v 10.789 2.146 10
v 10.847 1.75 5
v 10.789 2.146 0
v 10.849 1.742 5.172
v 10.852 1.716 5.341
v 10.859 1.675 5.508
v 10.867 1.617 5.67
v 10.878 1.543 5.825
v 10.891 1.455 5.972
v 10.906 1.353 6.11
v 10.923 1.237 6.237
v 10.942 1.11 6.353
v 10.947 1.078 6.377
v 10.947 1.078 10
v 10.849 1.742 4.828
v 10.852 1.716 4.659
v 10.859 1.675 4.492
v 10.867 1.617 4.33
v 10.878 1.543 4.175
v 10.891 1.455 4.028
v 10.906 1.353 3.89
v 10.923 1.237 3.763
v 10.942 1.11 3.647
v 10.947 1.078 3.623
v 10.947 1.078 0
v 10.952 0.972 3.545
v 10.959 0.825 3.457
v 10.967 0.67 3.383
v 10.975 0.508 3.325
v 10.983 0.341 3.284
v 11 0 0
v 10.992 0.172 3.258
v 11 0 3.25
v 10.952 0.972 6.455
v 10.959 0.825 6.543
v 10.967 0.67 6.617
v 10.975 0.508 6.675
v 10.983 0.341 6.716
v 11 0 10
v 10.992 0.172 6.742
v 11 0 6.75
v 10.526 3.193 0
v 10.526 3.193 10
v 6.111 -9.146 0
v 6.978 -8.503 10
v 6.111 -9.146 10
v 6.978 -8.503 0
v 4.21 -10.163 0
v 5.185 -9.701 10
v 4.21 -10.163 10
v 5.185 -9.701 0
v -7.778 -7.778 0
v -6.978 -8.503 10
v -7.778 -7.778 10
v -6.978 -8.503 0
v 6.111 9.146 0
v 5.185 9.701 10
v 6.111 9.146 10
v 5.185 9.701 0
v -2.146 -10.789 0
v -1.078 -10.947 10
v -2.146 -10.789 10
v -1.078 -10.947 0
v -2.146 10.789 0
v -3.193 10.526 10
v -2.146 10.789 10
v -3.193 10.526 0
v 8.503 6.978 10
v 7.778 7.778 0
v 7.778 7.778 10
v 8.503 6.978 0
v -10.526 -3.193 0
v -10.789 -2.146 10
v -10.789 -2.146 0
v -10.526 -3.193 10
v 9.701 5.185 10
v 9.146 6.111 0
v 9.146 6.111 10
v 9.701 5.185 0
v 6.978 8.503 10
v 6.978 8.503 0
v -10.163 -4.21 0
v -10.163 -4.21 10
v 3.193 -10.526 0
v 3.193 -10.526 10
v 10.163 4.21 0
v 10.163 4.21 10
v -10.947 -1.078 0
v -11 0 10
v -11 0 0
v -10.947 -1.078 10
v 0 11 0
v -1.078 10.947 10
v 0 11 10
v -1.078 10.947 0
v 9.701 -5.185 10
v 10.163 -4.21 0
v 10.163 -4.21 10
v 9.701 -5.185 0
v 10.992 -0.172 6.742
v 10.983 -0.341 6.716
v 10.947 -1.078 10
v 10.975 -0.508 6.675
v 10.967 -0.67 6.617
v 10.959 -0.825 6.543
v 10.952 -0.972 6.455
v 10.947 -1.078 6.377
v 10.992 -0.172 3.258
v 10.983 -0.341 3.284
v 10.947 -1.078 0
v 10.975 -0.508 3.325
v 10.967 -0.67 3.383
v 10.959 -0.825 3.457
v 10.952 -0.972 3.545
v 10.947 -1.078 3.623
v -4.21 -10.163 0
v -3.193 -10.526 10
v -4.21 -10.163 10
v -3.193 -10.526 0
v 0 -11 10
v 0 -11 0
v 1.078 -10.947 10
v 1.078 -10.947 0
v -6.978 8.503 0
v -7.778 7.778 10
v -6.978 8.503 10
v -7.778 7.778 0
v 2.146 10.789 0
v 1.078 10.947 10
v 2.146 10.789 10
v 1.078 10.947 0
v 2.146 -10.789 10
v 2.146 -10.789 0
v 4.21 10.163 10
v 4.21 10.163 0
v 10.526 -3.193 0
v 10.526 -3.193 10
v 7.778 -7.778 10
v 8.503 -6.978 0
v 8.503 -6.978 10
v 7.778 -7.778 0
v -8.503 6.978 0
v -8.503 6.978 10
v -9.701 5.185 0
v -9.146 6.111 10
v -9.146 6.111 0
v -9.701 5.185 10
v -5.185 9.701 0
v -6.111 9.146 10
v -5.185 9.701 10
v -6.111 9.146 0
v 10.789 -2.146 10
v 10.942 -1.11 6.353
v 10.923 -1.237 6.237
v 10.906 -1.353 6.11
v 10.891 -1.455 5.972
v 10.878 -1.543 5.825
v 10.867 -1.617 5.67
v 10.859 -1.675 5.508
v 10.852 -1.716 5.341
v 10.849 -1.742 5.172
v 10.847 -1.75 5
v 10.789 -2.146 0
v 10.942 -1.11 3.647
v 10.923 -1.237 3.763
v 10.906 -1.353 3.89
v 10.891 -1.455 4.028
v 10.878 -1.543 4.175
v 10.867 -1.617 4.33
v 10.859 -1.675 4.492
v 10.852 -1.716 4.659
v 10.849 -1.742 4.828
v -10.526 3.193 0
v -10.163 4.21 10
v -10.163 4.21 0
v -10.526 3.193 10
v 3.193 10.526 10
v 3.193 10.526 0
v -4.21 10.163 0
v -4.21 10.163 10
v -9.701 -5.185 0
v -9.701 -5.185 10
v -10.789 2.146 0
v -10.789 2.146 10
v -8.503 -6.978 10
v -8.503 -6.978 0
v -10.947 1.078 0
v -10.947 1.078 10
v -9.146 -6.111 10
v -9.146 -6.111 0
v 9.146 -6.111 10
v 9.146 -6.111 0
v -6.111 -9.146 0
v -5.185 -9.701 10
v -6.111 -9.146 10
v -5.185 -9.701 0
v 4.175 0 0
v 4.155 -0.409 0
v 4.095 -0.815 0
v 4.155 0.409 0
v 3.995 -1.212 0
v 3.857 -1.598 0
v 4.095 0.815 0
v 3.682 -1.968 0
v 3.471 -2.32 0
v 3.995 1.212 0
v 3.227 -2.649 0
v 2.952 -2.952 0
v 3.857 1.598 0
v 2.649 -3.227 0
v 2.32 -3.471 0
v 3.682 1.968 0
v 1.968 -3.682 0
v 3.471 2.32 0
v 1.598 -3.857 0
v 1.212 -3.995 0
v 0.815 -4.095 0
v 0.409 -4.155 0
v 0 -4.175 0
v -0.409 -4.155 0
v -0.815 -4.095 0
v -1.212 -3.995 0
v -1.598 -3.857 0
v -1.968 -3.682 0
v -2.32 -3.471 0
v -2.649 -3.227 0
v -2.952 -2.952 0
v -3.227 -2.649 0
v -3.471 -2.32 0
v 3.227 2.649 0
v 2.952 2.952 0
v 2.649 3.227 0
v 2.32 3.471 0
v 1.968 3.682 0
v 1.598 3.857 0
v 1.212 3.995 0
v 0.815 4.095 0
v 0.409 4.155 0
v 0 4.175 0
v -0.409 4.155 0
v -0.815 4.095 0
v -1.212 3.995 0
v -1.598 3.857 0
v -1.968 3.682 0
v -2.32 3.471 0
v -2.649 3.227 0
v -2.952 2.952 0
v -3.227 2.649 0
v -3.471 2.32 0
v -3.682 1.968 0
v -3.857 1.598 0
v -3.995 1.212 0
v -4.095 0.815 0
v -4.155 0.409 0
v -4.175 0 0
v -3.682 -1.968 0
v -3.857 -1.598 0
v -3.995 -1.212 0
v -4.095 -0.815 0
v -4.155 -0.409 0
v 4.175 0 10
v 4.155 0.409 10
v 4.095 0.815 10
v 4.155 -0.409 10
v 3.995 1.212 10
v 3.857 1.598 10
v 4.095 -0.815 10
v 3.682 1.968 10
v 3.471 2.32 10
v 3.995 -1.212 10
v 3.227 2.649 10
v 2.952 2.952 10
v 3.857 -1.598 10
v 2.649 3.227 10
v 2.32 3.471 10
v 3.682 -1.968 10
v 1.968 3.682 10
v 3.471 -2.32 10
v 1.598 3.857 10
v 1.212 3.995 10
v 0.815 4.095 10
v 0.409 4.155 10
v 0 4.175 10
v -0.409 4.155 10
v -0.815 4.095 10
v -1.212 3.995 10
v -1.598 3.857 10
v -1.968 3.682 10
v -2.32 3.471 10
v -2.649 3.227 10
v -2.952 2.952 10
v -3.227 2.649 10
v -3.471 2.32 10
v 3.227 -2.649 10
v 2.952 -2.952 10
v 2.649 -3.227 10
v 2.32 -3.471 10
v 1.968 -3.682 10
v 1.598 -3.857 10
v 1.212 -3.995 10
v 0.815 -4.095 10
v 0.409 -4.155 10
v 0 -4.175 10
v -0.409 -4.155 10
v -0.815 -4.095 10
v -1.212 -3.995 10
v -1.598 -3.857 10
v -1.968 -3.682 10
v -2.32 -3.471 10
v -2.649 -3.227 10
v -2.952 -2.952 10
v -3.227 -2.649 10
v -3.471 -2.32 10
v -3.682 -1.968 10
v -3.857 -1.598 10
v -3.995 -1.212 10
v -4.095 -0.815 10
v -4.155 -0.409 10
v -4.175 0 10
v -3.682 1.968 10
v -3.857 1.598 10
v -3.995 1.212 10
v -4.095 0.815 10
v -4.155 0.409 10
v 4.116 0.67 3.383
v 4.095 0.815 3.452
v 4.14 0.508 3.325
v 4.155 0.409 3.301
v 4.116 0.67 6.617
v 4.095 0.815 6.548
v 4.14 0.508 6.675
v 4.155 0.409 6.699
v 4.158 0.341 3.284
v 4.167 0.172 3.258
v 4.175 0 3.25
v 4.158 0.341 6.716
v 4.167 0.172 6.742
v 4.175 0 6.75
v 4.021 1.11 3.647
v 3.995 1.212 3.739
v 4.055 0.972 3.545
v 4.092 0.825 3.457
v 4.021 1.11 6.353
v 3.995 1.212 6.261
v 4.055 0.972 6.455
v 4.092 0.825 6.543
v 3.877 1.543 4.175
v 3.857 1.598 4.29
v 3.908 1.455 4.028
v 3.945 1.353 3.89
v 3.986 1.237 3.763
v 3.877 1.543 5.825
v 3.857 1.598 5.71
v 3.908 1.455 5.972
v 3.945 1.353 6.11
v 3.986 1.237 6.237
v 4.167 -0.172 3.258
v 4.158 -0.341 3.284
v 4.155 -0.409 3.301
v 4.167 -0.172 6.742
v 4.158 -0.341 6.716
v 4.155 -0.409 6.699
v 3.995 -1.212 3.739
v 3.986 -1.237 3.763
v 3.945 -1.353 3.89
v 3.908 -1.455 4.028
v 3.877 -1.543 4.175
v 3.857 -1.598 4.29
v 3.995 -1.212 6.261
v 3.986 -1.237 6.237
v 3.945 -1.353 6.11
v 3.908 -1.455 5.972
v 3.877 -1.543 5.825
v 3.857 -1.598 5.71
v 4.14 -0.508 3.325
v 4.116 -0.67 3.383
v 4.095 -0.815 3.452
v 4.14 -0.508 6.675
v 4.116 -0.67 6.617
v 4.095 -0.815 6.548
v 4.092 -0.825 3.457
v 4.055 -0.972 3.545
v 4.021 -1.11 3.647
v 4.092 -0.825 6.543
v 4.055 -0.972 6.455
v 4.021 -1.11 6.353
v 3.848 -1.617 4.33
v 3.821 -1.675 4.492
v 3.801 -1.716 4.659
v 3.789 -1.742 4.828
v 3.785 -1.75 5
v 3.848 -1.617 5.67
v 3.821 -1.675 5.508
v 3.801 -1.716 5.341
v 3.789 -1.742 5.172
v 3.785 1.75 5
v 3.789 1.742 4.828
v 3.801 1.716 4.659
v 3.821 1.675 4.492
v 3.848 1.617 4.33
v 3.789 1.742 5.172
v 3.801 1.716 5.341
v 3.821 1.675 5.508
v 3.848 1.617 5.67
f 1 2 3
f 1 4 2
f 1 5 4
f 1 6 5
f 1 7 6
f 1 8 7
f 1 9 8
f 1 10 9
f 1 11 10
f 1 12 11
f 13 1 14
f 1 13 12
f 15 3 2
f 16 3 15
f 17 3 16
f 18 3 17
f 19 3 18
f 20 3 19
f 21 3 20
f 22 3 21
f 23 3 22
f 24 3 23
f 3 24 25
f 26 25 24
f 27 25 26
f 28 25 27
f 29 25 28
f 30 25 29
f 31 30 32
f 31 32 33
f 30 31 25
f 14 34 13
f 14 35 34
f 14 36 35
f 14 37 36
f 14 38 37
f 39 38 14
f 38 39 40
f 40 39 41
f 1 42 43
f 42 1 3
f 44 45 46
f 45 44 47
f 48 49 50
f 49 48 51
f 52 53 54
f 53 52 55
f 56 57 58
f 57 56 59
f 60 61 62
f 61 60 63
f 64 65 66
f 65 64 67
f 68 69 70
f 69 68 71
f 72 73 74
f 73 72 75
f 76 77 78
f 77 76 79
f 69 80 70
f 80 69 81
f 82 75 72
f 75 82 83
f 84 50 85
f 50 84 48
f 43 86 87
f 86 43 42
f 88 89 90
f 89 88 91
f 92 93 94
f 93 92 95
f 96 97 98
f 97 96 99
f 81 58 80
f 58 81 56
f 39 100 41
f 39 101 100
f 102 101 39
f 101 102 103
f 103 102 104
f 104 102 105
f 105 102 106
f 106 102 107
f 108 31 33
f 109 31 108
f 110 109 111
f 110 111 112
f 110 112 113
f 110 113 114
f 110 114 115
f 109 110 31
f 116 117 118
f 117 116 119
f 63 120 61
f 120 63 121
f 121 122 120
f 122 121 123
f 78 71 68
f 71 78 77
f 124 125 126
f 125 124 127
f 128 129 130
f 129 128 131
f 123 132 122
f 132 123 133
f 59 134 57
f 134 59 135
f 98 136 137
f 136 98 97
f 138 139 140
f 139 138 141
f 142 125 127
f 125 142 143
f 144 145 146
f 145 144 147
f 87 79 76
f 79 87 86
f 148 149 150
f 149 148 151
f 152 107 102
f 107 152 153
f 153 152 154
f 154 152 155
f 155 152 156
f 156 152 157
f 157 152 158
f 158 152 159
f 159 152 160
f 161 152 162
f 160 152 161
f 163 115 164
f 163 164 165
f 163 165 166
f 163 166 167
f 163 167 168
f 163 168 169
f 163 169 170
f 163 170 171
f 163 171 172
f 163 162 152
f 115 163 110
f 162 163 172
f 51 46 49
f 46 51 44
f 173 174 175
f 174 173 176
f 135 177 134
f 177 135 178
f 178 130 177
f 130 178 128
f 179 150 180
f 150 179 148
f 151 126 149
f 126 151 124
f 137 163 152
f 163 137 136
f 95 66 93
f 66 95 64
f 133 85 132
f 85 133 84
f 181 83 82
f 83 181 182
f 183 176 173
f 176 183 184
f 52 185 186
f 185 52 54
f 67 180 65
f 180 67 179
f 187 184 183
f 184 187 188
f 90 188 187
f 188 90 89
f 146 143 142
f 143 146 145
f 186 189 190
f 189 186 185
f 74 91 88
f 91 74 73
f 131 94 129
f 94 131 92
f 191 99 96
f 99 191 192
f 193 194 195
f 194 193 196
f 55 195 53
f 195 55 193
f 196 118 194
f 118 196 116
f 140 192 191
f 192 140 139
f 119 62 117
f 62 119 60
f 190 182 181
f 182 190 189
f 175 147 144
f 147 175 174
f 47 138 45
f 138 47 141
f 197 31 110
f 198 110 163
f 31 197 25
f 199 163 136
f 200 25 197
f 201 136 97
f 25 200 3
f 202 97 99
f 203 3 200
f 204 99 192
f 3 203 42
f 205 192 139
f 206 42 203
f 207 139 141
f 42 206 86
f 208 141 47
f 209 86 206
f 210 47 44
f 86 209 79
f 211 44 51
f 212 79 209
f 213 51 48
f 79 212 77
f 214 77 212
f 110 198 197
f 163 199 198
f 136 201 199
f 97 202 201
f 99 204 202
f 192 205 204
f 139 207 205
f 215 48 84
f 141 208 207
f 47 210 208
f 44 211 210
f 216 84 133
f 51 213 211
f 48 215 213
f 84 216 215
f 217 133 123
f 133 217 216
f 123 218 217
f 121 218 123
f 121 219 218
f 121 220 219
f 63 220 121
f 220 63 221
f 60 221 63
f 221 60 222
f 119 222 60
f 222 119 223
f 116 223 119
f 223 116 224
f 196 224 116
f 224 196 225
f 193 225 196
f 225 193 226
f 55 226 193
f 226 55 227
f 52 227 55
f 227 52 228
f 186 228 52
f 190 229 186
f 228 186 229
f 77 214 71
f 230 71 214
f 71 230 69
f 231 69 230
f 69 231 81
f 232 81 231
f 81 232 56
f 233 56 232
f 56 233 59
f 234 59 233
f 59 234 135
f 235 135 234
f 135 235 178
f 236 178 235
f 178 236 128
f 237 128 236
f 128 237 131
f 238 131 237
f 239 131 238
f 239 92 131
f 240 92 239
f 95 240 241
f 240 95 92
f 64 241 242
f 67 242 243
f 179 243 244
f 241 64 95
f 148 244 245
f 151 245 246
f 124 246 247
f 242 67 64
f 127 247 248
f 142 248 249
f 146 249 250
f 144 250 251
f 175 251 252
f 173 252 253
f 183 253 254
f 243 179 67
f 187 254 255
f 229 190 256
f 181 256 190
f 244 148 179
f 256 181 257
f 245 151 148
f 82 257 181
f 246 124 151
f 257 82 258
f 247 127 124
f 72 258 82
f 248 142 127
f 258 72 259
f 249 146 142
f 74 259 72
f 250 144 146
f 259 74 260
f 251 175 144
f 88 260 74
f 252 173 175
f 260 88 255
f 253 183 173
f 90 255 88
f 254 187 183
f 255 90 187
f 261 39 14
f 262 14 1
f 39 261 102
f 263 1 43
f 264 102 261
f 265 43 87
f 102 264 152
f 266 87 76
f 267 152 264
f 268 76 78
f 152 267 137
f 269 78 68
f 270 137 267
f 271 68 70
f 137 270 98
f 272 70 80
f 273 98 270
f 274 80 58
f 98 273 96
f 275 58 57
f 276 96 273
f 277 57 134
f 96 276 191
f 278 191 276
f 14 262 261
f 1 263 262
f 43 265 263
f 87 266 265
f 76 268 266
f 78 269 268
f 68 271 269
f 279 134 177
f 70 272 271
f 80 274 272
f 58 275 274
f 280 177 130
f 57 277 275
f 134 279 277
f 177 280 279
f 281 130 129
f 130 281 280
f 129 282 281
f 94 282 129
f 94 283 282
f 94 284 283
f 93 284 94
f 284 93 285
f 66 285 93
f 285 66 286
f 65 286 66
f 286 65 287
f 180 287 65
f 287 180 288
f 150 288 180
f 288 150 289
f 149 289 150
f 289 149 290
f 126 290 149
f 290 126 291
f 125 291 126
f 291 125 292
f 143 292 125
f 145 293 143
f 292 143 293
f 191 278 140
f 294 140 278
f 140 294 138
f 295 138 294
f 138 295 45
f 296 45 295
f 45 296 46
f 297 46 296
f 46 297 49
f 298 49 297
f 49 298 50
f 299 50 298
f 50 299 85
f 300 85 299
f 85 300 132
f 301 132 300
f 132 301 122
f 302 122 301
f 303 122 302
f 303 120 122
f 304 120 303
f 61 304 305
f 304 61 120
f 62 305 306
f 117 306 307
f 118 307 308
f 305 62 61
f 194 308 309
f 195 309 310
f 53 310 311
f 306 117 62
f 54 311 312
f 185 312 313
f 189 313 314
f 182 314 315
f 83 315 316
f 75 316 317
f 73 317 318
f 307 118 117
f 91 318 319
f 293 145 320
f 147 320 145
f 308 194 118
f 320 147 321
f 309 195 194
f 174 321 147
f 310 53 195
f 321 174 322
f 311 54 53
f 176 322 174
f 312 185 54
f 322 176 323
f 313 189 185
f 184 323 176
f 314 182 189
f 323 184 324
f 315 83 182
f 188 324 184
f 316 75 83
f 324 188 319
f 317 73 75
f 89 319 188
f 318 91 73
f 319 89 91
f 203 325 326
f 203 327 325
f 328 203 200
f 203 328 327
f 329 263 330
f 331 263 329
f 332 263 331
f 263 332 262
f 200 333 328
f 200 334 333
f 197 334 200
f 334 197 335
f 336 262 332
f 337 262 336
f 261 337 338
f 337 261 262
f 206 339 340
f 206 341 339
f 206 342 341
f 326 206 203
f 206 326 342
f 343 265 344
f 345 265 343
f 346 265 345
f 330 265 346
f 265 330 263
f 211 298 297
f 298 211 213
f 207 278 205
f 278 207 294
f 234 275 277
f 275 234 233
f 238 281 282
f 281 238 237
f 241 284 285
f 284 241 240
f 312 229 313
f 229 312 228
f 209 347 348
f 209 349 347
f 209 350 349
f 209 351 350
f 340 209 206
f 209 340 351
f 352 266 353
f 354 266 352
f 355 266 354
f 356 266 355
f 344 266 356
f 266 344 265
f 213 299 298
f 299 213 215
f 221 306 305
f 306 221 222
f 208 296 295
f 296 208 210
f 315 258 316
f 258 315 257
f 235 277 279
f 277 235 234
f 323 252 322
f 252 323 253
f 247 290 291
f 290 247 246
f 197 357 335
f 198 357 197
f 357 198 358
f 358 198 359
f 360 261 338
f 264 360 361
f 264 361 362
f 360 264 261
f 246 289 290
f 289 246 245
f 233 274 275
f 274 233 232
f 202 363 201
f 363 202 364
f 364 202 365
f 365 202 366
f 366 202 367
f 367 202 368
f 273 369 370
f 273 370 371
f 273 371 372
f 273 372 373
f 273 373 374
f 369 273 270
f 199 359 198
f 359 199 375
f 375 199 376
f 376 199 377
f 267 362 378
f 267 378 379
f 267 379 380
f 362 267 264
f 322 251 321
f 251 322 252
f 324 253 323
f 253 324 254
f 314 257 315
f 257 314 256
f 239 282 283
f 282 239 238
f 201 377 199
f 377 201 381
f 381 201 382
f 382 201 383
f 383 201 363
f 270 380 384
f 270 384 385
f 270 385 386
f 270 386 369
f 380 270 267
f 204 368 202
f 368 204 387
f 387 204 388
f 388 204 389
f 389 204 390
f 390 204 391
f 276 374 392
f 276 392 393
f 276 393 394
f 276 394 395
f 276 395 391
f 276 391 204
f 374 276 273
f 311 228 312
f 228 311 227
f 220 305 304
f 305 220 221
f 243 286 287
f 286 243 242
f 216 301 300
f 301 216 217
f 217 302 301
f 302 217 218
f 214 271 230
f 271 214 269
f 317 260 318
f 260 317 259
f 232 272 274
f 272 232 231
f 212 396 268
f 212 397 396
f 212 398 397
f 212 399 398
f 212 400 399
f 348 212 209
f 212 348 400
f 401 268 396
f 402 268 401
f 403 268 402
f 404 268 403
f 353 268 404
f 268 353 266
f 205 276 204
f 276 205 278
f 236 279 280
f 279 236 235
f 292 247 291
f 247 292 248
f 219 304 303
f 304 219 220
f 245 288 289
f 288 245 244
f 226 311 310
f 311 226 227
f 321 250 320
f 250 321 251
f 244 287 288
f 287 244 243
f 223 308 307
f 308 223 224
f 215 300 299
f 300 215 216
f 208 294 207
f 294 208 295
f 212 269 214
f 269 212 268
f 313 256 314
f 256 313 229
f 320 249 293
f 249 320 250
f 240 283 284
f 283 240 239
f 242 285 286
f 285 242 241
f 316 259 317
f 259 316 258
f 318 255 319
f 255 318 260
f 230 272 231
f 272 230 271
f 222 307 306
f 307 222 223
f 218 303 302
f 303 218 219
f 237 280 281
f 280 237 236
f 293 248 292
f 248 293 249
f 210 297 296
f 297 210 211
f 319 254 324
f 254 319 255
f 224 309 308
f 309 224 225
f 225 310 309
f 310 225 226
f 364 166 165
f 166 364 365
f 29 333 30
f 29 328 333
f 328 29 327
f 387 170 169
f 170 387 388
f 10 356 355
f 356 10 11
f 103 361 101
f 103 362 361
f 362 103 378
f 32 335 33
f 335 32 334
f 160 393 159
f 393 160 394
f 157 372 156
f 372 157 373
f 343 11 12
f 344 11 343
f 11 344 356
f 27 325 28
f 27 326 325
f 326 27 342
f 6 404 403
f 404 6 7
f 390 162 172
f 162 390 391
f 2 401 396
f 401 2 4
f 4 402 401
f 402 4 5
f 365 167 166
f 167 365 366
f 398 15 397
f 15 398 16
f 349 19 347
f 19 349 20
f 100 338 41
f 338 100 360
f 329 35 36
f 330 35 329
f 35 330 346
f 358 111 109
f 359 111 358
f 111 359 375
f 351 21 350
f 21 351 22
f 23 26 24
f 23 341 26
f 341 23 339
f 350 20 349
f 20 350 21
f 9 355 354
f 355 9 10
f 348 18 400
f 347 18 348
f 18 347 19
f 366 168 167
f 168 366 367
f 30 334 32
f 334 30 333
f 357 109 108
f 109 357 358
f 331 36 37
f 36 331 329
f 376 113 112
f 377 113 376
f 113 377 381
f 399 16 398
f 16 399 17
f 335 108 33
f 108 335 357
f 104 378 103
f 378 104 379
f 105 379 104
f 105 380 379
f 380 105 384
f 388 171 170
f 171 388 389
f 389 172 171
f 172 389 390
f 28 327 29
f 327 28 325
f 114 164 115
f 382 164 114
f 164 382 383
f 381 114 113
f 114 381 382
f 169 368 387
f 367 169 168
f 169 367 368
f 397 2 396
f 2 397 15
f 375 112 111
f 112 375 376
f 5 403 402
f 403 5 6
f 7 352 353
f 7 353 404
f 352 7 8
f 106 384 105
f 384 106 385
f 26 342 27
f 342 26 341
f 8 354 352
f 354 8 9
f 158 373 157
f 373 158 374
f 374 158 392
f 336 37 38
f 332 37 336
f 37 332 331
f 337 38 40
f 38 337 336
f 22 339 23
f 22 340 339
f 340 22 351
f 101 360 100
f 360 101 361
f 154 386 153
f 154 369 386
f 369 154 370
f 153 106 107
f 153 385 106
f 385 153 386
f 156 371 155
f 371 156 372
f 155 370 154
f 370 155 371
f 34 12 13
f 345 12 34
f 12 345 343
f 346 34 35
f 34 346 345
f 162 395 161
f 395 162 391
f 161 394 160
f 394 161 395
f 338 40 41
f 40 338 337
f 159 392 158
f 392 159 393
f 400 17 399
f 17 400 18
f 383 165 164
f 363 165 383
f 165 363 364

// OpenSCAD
// file: parameters.scad
// =============================================================================
// Gen-AN Dual-rotor copper-centroid hyper AFPM - WOUND-AWARE (HARD GATE)
// PRIMARY challenger vs Gen-AK. Magnets @ R=39.5 + 200 t + former_web 1.30 -> m2m 4.76.
// =============================================================================

// --- Wire / wind budget (26 AWG, ~1 lb spool ~ 390 m bare-equiv) --------------
wire_awg            = 26;
wire_od             = 0.45;     // insulated OD mm
turns               = 200;      // +10 vs Gen-AK 190
fill                = 0.70;
layers_per_face     = 2;        // axial layers proud of EACH flange
wind_build_axial    = layers_per_face * wire_od * fill;   // 0.63 mm
wind_build_radial   = 3 * wire_od * fill;                 // 0.945 mm

// --- Pancake former (bare STL) -----------------------------------------------
coil_id_r           = 15.5;     // copper-centroid window centered ~R=39.5
coil_od_r           = 63.5;
span_deg            = 26.0;     // 12 stations x 30 deg pitch
former_web          = 1.30;     // thinner vs AK 1.40 (print-safe >=1.30)
flange_t            = 0.60;
wall                = 1.2;
slot_w              = 2.4;
mount_hole          = 3.5;
tab_len             = 7.0;

former_bare_h       = former_web + 2 * flange_t;            // 2.50 mm
coil_envelope_h     = former_bare_h + 2 * wind_build_axial; // 3.76 mm

// --- Running clearance (magnet face -> WOUND face) EACH side ------------------
run_clear           = 0.50;     // PASS floor >= 0.5
gap_spacer_h        = run_clear + wind_build_axial;         // 1.13 mm
m2m                 = coil_envelope_h + 2 * run_clear;      // 4.76 mm (beats Gen-AK 4.86)

// --- Mid stator (12 pancakes 3ph; winds proud both faces) ---------------------
coil_stations       = 12;
bay_r_in            = coil_id_r - 2.0 - wind_build_radial;
bay_r_out           = coil_od_r + 2.0 + wind_build_radial;
bay_span            = span_deg + 4.0;
bay_offset          = 2.0;
stator_thick        = former_bare_h;                        // winds proud +/-Z
stator_od           = 160.0;
shaft_clear_stator  = 34.0;
coil_mount_r        = 25.5;

// --- Rotors (x2) - 8xO20 @ R=39.5 (copper centroid) + 24xO5 Halbach ----------
large_pocket_d      = 20.3;
small_pocket_d      = 5.3;
pocket_h            = 5.2;
large_n             = 8;
R_large             = 39.5;     // covers ~29.5-49.5 over copper centroid ~39.5
R_small_inner       = 24.5;
R_small_mid         = 39.5;
R_small_outer       = 56.5;
carrier_od          = 156.0;
carrier_thick       = 7.5;
hub_h               = 10.0;
hub_od              = 30.0;
rotor_b_offset_deg  = 22.5;

// --- Modular MAX interface (Gen-E family) ------------------------------------
shaft_bore          = 8.35;
bearing_d           = 21.85;
bearing_h           = 7.2;
m3_clear            = 3.5;
bolt_r_inner        = 36.0;
bolt_n_inner        = 6;
flange_bolt_r       = 72.0;
flange_bolt_n       = 6;
brace_r             = 68.0;
brace_d             = 4.3;
brace_n             = 4;

spacer_pad_od       = 14.0;
spacer_pad_id       = m3_clear;
endbell_od          = 160.0;
endbell_thick       = 8.0;
endbell_shaft_clear = 10.0;

$fn = 64;
// main file
// Gen-AN shaft collar — print ×2–4
include <parameters.scad>;
$fn = 64;
od = 22; id = shaft_bore; h = 10; set_d = 3.5;
difference() {
    cylinder(d=od, h=h);
    translate([0, 0, -0.1]) cylinder(d=id, h=h + 0.2);
    translate([0, 0, h/2]) rotate([0, 90, 0]) cylinder(d=set_d, h=od);
}
